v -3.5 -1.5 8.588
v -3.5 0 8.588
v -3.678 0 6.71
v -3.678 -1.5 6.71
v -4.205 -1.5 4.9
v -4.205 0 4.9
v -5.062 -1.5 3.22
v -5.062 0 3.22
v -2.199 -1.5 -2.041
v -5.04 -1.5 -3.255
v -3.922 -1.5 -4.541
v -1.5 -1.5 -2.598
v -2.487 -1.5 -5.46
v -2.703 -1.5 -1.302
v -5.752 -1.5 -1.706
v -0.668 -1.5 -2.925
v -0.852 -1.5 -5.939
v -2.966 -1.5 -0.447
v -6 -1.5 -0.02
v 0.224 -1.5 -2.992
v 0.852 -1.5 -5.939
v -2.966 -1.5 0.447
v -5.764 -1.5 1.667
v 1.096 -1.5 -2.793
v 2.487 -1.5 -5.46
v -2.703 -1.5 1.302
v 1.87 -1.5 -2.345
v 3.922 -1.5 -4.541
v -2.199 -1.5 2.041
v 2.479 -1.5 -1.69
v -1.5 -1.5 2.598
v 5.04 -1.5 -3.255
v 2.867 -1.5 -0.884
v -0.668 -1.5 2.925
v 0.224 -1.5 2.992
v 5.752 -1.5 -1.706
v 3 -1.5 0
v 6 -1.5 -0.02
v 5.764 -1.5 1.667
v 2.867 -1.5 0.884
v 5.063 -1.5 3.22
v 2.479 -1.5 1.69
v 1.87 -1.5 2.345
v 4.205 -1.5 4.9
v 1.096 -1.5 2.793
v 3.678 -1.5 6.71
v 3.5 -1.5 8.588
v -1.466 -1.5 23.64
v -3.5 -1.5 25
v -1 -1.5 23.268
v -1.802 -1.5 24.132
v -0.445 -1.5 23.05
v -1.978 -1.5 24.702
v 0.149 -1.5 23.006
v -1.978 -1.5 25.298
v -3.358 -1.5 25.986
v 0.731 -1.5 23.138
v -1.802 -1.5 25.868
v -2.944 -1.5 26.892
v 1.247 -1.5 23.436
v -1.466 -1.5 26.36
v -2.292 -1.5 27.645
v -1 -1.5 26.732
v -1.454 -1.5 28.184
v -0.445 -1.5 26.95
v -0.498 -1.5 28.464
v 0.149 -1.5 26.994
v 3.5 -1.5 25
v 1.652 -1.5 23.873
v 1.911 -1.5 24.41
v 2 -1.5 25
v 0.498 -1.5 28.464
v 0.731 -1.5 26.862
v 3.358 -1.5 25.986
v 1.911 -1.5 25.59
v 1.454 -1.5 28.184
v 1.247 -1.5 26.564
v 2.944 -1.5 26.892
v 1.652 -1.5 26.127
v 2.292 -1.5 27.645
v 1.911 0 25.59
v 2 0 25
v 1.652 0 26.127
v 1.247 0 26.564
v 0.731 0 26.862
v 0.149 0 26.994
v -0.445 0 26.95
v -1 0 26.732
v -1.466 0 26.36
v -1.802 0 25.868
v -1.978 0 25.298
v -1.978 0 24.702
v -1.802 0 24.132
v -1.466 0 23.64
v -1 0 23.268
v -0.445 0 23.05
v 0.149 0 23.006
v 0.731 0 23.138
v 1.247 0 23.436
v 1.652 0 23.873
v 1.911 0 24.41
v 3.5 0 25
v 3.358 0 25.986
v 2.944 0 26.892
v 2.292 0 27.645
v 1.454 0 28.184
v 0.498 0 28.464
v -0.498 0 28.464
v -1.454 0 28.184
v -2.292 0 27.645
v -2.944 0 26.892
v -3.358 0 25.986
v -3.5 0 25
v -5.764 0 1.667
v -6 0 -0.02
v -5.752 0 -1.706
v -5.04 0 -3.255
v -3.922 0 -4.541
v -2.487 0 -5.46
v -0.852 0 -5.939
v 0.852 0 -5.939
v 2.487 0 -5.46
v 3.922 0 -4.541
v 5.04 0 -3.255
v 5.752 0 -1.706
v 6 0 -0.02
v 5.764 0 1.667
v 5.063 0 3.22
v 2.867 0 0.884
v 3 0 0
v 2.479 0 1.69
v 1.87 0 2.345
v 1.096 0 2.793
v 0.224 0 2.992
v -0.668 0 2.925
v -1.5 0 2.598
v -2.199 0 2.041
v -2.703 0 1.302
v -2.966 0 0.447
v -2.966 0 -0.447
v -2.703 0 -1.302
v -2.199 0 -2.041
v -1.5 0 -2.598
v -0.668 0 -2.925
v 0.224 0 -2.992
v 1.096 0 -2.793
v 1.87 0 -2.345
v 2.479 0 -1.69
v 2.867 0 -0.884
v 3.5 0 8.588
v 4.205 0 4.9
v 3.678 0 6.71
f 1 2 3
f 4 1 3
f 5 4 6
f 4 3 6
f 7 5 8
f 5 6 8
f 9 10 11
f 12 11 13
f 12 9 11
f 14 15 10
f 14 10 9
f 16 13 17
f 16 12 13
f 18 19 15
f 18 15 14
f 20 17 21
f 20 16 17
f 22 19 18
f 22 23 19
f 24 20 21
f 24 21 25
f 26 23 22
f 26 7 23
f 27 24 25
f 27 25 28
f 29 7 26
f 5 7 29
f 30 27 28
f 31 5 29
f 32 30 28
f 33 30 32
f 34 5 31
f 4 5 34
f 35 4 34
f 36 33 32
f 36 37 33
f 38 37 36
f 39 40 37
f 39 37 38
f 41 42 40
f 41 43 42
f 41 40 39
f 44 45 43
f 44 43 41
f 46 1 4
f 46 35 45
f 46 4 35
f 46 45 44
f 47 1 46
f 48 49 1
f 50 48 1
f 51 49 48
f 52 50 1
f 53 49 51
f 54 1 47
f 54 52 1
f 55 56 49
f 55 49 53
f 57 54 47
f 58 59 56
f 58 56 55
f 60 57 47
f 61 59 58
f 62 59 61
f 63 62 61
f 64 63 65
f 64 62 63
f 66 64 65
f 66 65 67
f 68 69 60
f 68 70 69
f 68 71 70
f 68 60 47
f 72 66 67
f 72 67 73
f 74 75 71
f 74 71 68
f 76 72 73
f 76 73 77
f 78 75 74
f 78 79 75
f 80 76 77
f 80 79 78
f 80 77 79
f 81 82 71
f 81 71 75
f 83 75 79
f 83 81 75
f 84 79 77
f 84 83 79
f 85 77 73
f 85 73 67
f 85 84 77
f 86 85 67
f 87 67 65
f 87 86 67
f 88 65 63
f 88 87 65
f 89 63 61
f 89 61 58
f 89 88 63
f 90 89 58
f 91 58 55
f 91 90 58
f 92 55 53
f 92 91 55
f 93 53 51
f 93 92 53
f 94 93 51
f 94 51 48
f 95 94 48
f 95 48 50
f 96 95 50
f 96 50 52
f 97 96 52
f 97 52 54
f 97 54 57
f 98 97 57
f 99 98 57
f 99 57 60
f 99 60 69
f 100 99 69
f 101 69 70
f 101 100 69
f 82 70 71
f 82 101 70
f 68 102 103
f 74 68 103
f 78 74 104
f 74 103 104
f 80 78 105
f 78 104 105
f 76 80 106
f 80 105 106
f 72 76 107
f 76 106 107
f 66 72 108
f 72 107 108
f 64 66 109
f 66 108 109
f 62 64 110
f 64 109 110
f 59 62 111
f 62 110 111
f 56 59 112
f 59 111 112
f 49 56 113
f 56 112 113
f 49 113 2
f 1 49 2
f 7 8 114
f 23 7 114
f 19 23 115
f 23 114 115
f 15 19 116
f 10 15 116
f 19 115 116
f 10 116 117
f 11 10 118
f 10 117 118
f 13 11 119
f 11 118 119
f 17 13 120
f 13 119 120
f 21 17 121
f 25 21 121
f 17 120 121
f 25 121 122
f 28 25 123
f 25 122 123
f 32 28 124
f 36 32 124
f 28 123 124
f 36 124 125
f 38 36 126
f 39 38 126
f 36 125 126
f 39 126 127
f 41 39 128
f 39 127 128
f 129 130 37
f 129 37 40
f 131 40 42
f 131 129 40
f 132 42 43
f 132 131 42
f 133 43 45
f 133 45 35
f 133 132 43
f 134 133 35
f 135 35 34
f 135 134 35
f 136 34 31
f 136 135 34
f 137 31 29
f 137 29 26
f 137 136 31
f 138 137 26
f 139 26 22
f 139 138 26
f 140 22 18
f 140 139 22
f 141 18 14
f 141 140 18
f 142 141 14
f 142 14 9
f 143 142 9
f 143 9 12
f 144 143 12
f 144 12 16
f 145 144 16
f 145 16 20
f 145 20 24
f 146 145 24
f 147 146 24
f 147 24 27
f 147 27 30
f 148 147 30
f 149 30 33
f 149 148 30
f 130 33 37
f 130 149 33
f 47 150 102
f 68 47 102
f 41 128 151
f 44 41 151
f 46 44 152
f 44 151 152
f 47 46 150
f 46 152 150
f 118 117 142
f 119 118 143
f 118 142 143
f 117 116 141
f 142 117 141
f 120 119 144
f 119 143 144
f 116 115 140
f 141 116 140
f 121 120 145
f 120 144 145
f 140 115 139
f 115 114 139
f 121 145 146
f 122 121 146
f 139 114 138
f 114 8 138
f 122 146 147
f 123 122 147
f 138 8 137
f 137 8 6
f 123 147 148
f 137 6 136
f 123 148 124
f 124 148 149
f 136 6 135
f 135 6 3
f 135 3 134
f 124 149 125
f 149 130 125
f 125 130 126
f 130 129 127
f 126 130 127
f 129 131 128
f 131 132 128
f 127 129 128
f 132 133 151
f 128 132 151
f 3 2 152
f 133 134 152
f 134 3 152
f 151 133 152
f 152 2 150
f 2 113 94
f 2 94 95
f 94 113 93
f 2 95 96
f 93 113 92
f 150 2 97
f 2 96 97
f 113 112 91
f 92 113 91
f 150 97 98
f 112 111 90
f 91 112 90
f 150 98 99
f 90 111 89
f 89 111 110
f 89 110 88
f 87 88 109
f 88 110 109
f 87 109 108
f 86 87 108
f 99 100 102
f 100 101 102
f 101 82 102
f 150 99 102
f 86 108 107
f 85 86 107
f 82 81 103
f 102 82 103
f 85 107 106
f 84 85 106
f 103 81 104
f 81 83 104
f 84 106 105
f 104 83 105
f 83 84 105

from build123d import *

# Parameters (mm, degrees)
F0_R     = 3
F0_R_2   = 2
F1_DEPTH = 1.5


with BuildPart() as f1:
    # F0 (on Front) → F1 (new body)
    with BuildSketch(Plane.XZ):
        with BuildLine():
            ThreePointArc((3.5, 25), (0, 28.5), (-3.5, 25))
            Line((-3.5, 25), (-3.5, 8.587782))
            ThreePointArc((-3.5, 8.587782), (-3.898568, 5.792697), (-5.0625, 3.220418))
            ThreePointArc((-5.0625, 3.220418), (0, -6), (5.0625, 3.220418))
            ThreePointArc((5.0625, 3.220418), (3.898568, 5.792697), (3.5, 8.587782))
            Line((3.5, 8.587782), (3.5, 25))
        make_face()
        Circle(F0_R, mode=Mode.SUBTRACT)
        with Locations((0, 25)):
            Circle(F0_R_2, mode=Mode.SUBTRACT)
    extrude(amount=F1_DEPTH)


solid = f1.part
